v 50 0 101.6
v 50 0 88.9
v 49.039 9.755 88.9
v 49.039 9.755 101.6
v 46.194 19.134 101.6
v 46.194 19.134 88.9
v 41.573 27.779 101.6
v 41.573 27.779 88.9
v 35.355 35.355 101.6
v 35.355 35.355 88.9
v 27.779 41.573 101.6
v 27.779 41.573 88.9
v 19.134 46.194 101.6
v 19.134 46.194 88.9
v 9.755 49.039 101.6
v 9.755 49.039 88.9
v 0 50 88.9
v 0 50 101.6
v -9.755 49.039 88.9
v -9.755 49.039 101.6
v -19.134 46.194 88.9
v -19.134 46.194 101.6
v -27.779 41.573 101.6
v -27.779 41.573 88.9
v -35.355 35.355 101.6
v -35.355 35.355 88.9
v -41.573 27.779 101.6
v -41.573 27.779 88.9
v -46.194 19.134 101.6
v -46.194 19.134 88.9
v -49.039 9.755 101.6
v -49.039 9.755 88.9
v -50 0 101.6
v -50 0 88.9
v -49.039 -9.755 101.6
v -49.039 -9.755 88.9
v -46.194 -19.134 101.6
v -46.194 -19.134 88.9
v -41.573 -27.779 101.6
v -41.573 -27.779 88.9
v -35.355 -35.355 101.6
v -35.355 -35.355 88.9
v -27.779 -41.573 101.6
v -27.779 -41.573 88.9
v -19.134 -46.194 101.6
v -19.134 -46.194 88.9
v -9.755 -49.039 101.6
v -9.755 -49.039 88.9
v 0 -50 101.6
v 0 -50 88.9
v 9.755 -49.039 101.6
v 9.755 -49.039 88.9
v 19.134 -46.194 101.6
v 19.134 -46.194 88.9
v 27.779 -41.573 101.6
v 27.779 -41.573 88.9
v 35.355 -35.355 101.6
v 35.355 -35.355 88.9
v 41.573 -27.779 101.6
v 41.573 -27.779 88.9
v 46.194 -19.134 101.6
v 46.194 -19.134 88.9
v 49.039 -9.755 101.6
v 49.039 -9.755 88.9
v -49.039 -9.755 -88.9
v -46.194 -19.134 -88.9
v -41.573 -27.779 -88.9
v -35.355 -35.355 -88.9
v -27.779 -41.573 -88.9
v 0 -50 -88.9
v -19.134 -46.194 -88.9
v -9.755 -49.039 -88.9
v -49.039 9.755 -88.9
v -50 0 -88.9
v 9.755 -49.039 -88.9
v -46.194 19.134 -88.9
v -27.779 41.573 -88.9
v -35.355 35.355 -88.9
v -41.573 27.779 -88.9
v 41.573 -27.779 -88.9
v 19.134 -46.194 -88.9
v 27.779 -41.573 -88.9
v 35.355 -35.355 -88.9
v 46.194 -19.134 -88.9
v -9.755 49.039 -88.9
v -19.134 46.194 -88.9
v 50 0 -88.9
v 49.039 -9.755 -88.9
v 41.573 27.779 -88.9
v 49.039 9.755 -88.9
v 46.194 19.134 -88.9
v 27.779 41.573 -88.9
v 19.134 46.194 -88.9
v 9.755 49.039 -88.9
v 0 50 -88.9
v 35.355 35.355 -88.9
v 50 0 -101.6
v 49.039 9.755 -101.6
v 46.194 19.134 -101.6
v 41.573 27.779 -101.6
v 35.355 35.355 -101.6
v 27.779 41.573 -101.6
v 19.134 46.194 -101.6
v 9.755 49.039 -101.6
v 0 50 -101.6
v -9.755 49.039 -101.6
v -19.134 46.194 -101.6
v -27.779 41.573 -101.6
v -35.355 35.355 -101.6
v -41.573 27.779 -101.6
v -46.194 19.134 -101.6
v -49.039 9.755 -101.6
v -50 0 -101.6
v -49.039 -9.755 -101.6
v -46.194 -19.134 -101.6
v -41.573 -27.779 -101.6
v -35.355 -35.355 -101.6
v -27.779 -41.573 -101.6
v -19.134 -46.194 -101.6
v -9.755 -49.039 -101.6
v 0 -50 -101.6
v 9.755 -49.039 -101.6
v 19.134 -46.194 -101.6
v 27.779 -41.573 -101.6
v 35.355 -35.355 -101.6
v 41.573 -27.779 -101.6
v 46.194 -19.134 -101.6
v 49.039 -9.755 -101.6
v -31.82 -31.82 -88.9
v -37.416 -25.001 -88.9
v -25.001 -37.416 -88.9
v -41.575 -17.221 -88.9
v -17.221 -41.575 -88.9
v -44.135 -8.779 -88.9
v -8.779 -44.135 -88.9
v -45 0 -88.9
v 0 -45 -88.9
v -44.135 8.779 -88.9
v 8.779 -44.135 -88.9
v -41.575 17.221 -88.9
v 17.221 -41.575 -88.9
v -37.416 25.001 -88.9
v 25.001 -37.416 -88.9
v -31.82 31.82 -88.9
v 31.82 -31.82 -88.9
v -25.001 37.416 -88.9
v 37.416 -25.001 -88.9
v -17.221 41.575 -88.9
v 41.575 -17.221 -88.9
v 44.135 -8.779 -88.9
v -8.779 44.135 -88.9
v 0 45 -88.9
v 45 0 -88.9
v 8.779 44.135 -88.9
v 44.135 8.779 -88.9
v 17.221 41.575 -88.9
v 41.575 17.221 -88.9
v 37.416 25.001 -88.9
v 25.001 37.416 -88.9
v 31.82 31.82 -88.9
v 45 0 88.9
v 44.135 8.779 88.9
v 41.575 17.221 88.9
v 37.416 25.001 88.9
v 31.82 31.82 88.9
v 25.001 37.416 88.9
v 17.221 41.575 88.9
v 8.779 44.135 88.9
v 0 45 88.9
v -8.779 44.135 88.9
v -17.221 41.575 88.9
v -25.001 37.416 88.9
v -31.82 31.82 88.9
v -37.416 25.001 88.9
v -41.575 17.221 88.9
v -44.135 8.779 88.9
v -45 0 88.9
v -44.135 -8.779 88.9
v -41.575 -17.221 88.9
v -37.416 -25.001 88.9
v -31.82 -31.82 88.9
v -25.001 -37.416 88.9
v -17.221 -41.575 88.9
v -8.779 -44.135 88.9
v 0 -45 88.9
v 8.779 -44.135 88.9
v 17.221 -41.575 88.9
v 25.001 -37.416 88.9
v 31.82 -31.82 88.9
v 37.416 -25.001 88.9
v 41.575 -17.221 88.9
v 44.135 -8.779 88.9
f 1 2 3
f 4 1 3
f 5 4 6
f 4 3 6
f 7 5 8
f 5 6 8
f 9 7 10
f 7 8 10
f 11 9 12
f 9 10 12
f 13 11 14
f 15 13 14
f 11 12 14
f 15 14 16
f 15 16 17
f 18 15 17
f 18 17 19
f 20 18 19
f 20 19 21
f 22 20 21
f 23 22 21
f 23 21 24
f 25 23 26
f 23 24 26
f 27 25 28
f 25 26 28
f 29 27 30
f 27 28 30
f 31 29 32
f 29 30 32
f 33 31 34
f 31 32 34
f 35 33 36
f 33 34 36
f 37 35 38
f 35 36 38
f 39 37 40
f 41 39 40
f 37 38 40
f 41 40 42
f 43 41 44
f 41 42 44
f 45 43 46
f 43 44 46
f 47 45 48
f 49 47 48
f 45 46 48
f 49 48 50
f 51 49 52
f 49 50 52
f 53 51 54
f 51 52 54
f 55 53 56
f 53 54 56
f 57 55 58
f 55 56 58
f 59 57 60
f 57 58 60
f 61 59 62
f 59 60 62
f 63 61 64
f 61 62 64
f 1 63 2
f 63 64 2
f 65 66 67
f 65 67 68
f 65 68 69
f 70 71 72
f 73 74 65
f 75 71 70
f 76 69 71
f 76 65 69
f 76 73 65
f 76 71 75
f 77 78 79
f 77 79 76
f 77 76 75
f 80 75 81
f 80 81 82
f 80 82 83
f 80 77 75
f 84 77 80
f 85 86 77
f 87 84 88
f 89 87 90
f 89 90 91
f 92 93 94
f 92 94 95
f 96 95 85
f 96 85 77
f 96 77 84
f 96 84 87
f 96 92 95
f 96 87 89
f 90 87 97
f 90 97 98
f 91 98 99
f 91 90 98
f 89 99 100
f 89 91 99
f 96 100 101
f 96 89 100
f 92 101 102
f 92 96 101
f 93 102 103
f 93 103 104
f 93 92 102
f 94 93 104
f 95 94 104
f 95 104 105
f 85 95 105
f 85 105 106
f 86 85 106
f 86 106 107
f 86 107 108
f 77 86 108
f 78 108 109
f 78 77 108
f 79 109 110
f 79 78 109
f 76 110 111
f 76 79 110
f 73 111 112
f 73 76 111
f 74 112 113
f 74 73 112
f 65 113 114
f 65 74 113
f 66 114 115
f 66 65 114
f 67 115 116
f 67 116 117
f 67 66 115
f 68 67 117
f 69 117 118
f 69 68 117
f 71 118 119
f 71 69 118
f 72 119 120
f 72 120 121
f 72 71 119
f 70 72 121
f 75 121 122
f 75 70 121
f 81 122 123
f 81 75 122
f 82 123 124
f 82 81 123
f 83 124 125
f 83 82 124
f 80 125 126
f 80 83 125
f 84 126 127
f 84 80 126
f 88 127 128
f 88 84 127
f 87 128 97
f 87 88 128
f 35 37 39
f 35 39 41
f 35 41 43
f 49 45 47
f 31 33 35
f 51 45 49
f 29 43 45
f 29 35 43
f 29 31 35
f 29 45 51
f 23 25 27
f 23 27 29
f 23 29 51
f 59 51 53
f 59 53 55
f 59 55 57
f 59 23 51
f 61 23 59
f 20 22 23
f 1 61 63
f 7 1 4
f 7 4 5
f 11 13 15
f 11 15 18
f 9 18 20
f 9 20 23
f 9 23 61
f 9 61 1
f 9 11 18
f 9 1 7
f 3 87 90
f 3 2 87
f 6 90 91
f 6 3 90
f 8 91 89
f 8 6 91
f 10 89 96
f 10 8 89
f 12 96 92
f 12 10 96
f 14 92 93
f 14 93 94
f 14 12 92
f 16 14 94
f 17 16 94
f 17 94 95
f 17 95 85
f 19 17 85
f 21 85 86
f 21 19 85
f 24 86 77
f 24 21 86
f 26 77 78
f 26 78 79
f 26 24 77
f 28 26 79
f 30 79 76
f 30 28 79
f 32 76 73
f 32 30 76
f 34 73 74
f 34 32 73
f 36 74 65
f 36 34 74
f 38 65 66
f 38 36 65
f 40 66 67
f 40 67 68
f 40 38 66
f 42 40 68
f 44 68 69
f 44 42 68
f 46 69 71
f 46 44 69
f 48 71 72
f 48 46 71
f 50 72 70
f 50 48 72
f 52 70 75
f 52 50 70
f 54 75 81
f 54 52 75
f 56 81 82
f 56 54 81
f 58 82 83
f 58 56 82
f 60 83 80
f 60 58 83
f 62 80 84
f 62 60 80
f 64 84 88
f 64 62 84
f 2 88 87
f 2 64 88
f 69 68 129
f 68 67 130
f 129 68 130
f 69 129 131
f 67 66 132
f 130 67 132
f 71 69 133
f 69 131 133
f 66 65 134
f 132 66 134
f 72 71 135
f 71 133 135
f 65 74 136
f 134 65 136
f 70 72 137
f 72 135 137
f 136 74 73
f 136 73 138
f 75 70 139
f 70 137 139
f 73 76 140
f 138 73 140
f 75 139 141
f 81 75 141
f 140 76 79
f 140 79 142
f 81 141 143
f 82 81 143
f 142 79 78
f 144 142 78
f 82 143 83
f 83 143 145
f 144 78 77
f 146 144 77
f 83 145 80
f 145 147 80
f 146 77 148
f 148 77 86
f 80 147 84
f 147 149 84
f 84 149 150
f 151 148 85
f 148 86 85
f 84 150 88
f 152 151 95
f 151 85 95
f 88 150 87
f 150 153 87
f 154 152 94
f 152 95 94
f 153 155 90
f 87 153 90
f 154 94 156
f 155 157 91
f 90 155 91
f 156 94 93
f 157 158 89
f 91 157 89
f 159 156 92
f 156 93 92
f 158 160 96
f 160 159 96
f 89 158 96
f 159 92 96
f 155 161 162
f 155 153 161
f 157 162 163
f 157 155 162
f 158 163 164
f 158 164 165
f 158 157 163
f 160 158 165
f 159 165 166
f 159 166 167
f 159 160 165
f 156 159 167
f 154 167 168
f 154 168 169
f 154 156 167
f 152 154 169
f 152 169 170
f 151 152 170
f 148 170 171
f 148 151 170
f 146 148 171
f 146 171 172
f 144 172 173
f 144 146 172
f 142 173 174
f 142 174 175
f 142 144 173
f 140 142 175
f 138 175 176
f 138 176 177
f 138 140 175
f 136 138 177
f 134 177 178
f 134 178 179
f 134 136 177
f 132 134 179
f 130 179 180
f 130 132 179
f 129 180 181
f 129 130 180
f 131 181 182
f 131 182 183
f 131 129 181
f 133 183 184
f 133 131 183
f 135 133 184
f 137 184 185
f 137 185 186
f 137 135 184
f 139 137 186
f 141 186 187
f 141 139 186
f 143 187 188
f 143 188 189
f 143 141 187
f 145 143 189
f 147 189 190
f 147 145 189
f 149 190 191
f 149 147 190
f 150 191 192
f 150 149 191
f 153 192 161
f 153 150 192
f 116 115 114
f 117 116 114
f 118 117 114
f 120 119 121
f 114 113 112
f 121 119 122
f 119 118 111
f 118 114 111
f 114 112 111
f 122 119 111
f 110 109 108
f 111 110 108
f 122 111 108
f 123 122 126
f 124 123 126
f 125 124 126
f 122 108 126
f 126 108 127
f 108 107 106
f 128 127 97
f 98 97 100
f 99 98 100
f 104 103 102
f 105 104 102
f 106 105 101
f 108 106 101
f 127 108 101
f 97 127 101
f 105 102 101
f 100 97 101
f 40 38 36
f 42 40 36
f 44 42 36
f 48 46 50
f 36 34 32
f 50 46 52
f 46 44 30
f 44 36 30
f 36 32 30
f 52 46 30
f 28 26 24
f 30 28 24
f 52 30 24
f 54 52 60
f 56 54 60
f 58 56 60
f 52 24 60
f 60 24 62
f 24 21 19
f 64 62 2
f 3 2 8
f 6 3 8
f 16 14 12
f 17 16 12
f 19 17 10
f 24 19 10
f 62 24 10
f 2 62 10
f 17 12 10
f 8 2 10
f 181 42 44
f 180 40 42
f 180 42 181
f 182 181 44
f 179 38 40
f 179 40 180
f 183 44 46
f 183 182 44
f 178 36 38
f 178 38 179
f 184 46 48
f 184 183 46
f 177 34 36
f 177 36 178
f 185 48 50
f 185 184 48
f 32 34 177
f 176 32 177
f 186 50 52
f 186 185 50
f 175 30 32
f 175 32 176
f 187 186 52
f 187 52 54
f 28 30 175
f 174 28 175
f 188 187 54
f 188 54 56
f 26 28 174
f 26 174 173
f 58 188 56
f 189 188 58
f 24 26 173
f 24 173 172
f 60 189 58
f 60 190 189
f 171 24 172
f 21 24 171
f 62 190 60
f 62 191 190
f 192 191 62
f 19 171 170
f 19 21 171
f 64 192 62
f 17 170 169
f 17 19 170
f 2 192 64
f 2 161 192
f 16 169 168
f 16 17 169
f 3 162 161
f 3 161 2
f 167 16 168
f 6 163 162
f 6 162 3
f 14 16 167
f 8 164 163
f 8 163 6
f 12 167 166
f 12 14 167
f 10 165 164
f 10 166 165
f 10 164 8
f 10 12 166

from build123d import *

# Parameters (mm, degrees)
E_HOUSING_BASE_SKETCH_R   = 50
E_HOUSING_BASE_SKETCH_R_2 = 45
E_HOUSING_BASE_DEPTH      = 88.9
SKETCH3_R                 = 50
END_CAP_1_DEPTH           = 12.7


with BuildPart() as part:
    # E-Housing Base Sketch → E-Housing Base (new, symmetric)
    with BuildSketch(Plane.XY):
        Circle(E_HOUSING_BASE_SKETCH_R)
        Circle(E_HOUSING_BASE_SKETCH_R_2, mode=Mode.SUBTRACT)
    extrude(amount=E_HOUSING_BASE_DEPTH, both=True)


with BuildPart() as body_2:
    # Sketch3 → End Cap 1 (new body)
    with BuildSketch(Plane.XY.offset(88.9)):
        Circle(SKETCH3_R)
    extrude(amount=END_CAP_1_DEPTH)


with BuildPart() as body_3:
    # End Cap 2: mirrored copy
    add(body_2.part.mirror(Plane.XY))


solid = Compound([part.part, body_2.part, body_3.part])
